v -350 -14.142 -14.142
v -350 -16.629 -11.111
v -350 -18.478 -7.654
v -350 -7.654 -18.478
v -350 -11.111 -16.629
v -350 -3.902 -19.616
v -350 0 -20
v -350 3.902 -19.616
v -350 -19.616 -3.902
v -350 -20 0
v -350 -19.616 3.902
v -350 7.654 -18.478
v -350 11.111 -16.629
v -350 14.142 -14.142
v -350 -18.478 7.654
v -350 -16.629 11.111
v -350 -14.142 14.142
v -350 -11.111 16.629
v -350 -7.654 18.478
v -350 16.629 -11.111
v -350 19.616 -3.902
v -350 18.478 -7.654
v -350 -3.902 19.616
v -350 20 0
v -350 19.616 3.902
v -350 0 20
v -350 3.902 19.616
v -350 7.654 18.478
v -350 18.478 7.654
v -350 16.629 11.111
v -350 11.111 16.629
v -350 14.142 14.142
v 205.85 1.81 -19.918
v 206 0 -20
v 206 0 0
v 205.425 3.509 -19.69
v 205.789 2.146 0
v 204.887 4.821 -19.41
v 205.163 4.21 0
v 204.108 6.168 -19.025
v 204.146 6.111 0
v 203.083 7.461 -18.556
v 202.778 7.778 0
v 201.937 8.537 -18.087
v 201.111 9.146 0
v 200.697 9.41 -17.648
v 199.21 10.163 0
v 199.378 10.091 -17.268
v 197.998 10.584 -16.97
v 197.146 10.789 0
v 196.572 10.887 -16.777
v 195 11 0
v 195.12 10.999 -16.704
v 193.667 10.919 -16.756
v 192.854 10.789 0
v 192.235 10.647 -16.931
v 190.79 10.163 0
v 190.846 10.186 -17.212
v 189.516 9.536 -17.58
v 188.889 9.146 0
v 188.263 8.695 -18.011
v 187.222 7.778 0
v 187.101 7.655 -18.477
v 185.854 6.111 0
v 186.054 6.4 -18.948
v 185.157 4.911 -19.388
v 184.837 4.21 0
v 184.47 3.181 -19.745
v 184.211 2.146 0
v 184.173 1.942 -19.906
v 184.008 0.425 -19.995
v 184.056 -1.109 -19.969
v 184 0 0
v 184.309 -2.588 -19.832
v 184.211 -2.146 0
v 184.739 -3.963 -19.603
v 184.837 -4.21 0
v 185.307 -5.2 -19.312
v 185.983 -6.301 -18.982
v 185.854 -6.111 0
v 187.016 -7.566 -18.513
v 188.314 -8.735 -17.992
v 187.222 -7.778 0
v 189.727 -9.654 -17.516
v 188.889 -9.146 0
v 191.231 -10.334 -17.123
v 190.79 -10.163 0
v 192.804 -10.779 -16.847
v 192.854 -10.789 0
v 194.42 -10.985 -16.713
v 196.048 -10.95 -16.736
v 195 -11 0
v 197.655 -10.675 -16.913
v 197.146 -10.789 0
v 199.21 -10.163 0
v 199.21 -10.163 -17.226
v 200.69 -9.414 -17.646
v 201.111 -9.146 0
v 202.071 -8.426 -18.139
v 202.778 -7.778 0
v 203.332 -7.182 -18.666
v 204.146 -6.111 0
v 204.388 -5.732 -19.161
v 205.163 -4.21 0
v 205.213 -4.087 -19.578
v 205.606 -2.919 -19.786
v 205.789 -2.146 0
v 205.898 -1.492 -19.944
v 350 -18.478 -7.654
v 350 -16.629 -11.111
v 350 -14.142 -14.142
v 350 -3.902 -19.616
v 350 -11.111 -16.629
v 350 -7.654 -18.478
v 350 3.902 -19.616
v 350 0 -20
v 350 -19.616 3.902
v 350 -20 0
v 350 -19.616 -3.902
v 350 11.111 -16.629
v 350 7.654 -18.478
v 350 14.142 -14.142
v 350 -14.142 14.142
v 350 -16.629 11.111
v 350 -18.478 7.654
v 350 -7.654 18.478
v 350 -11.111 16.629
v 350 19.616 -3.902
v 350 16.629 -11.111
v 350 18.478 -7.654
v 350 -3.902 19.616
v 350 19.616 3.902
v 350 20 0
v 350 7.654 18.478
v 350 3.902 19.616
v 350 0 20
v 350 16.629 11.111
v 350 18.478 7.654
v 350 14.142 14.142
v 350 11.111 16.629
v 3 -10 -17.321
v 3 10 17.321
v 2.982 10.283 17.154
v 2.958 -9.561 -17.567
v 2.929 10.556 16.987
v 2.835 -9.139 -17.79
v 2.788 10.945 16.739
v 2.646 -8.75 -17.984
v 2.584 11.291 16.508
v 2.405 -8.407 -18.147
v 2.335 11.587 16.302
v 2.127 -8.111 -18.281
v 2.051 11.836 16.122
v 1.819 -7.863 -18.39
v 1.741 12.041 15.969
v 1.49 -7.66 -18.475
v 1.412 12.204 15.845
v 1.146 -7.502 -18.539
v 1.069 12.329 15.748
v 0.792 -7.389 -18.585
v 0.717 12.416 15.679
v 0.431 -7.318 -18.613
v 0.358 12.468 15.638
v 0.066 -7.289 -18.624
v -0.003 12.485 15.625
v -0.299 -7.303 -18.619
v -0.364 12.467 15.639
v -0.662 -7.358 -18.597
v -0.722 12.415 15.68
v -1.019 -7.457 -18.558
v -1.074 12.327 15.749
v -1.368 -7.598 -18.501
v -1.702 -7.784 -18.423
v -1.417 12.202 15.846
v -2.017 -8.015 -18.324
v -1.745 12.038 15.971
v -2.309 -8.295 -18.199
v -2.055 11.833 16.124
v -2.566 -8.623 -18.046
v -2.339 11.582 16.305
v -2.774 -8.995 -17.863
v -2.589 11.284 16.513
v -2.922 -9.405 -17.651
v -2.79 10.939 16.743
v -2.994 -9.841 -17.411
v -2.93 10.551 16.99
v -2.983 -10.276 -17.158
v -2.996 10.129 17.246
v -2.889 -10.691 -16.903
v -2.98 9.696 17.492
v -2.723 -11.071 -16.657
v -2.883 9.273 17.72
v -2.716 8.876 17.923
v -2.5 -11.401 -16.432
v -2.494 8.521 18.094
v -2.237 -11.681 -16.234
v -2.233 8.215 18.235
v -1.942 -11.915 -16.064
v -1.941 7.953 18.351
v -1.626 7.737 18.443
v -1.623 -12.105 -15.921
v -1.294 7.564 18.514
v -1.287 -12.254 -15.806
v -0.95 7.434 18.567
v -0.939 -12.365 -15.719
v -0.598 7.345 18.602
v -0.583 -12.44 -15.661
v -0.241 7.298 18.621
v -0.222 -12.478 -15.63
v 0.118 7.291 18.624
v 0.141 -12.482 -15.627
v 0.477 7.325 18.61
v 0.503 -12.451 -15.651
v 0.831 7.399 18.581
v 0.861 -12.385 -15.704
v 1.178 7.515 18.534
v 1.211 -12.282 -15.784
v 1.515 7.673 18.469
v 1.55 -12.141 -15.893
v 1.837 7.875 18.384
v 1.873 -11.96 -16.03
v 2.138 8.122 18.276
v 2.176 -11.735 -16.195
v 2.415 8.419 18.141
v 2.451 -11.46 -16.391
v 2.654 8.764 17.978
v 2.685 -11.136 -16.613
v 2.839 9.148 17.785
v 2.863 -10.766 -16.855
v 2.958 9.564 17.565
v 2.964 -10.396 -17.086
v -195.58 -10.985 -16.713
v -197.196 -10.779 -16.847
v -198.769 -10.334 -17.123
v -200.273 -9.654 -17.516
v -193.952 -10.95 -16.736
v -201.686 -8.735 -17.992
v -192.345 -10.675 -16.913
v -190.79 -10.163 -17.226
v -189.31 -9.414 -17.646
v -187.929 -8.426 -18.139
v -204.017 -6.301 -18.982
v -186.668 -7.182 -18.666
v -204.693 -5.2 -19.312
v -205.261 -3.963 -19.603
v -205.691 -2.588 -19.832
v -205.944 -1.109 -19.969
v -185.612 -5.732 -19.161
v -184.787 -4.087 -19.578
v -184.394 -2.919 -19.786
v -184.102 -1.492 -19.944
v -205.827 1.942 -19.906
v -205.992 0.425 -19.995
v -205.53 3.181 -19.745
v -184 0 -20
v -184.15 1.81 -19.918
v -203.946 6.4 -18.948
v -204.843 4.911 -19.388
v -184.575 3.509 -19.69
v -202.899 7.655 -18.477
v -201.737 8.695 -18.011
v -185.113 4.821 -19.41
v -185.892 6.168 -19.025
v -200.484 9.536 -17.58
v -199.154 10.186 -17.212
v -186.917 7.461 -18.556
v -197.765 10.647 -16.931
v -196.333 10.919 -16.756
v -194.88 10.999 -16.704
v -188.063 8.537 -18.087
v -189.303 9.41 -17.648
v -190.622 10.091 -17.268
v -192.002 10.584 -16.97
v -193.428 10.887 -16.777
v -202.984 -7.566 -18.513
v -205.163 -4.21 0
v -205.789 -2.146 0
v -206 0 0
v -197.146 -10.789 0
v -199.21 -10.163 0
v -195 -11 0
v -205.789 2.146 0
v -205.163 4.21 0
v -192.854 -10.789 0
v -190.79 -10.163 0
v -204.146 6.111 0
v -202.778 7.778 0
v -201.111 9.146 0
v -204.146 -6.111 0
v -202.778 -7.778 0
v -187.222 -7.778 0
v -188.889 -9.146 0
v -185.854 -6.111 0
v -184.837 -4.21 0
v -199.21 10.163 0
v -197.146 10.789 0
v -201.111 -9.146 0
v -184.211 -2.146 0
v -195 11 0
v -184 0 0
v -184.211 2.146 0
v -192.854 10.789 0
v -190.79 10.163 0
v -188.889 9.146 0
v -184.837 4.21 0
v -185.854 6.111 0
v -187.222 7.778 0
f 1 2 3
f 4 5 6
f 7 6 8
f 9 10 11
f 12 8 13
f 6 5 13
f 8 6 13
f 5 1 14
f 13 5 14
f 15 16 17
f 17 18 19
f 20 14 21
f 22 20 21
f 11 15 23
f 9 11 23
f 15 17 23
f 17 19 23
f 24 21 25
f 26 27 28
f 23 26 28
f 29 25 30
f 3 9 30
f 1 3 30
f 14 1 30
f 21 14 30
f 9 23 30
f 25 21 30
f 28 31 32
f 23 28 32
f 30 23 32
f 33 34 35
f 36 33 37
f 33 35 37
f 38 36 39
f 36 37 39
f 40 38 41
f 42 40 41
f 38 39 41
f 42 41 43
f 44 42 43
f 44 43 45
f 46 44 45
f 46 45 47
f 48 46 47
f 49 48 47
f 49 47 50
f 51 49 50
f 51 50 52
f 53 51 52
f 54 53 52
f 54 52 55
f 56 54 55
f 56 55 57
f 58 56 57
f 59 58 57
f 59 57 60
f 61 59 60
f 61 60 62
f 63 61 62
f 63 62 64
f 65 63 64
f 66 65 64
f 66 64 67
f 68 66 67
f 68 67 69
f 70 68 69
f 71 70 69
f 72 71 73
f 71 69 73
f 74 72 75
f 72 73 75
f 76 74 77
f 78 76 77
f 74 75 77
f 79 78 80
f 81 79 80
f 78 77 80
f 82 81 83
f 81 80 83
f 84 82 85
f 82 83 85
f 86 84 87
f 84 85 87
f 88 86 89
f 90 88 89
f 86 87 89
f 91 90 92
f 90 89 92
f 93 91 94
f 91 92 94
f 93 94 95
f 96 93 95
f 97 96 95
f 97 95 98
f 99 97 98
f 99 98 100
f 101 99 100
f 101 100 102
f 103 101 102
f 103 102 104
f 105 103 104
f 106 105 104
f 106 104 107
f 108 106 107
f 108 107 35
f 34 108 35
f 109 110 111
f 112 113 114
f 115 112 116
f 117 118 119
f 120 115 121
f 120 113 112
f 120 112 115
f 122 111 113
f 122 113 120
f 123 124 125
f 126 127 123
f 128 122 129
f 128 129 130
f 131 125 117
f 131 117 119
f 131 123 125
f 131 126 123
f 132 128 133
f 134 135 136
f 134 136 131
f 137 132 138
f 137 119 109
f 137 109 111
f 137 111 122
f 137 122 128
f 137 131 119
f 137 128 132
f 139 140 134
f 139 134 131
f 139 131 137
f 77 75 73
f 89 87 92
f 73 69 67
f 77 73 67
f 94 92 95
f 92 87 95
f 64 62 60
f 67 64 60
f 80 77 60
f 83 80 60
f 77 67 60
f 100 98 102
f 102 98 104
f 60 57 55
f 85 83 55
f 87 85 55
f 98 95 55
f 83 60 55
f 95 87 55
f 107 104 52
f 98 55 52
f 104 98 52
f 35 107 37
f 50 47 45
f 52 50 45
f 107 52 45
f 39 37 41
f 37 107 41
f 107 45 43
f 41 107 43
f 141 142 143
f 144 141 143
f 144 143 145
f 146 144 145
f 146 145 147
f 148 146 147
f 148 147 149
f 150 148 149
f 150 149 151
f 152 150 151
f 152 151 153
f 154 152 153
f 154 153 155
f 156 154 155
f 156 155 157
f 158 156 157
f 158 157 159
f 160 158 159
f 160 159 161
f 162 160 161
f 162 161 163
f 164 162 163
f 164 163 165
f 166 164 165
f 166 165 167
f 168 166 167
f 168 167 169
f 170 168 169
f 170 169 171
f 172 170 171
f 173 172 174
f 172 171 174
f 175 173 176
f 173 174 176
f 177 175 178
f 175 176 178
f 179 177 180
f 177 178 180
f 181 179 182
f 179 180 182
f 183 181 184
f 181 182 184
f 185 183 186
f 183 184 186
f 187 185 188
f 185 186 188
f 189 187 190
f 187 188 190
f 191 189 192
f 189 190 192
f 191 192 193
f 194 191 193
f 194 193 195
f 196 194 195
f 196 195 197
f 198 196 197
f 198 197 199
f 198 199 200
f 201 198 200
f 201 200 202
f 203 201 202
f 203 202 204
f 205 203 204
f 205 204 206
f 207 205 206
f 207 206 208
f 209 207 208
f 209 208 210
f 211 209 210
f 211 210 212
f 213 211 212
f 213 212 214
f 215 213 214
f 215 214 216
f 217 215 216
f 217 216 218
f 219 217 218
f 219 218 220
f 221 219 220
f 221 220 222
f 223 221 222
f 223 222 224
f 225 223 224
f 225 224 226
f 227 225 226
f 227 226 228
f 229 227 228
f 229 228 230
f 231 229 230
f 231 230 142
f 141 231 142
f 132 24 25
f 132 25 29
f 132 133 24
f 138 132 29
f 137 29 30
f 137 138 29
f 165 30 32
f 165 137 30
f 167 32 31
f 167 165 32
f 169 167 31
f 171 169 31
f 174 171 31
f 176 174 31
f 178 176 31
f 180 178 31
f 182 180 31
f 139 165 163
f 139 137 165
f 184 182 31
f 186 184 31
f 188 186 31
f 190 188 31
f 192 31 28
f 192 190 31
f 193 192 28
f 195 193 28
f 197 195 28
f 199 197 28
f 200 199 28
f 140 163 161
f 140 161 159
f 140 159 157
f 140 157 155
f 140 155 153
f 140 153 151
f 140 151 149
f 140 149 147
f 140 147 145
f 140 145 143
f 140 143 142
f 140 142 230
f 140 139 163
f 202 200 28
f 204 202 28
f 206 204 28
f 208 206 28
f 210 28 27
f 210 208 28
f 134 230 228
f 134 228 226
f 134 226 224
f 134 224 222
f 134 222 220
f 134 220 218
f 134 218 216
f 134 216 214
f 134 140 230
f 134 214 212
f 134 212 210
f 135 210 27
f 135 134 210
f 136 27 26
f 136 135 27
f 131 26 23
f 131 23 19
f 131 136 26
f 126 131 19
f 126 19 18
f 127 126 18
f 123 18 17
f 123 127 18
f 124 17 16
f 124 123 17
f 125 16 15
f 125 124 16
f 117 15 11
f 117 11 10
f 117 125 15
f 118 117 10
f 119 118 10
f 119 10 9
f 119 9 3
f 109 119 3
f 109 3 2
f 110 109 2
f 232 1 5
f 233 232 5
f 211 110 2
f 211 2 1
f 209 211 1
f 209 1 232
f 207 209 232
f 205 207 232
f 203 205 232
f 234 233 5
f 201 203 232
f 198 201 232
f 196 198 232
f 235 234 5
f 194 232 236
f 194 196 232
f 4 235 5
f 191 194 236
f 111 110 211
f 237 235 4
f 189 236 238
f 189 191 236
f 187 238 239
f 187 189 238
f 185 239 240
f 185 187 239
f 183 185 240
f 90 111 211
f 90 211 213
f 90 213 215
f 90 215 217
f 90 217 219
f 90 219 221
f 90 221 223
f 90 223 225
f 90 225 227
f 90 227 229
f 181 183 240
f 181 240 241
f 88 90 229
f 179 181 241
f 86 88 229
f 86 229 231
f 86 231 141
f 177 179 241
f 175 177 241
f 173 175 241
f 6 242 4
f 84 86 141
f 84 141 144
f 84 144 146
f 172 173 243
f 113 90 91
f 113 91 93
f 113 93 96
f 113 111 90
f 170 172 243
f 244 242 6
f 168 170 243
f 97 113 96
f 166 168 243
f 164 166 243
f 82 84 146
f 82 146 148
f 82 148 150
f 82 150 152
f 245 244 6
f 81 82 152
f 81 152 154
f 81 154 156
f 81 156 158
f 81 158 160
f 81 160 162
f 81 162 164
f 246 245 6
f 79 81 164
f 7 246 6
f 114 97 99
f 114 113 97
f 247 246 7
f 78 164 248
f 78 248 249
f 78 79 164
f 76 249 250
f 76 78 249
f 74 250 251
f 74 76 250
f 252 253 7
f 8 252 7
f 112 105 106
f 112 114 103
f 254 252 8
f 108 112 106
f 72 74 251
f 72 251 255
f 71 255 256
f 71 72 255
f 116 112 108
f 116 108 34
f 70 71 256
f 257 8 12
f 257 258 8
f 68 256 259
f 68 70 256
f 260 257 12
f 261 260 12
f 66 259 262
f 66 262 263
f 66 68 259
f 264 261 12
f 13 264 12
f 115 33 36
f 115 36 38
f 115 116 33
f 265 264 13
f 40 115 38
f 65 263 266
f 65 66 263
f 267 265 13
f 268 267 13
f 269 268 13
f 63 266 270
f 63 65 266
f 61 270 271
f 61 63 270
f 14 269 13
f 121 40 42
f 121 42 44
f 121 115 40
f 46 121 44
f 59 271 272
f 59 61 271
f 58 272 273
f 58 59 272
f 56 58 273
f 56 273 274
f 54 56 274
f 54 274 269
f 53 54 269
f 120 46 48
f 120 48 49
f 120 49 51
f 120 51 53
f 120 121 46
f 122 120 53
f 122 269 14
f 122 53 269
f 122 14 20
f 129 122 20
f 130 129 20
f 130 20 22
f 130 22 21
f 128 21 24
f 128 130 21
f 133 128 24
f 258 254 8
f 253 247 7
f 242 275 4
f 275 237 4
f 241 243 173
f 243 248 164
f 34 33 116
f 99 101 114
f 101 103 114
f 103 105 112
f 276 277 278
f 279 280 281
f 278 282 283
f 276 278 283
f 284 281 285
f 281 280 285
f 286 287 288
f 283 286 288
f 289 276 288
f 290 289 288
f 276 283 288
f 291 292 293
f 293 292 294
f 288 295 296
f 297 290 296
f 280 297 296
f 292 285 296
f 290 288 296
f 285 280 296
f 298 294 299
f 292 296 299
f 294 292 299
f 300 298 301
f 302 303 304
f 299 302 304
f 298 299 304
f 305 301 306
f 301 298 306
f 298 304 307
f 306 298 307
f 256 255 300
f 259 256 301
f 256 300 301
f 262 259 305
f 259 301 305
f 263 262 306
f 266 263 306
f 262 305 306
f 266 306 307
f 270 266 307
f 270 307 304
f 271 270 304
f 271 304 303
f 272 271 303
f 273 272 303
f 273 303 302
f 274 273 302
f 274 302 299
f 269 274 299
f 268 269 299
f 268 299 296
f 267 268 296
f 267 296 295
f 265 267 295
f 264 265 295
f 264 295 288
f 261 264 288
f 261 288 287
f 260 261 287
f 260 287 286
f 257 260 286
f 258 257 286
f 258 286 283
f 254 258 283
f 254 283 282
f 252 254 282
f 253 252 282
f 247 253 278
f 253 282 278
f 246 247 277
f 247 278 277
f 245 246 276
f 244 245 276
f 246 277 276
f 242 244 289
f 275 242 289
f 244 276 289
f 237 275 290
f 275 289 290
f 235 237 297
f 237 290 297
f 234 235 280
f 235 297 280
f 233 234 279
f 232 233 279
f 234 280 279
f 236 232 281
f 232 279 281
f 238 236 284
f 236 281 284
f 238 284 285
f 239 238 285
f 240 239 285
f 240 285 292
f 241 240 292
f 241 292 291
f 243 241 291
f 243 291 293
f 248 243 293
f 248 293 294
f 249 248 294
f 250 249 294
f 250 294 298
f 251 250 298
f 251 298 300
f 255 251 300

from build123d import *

# Parameters (mm, degrees)
F1_DEPTH = 350
F2_R     = 11
F3_DEPTH = 25.4
F5_R     = 3
F6_DEPTH = 47.3215082123


with BuildPart() as f1:
    # F0 (on Right) → F1 (new body, symmetric)
    with BuildSketch(Plane.YZ):
        with BuildLine():
            ThreePointArc((10, 17.3205080757), (-17.3205080757, -10), (20, 0))
            ThreePointArc((20, 0), (17.3205080757, 10), (10, 17.3205080757))
        make_face()
    extrude(amount=F1_DEPTH, both=True)

    # F2 (on Top) → F3 (cut)
    with BuildSketch(Plane.XY):
        with Locations((-195, 0)):
            Circle(F2_R)
        with Locations((195, 0)):
            Circle(F2_R)
    extrude(amount=-F3_DEPTH, mode=Mode.SUBTRACT)

    # F5 (on face) → F6 (cut, through all)
    with BuildSketch(Plane(origin=(0, 10, 17.3205080757), x_dir=(1, 0, 0), z_dir=(0, 0.5, 0.8660254038))):
        Circle(F5_R)
    extrude(amount=-F6_DEPTH, mode=Mode.SUBTRACT)


solid = f1.part
